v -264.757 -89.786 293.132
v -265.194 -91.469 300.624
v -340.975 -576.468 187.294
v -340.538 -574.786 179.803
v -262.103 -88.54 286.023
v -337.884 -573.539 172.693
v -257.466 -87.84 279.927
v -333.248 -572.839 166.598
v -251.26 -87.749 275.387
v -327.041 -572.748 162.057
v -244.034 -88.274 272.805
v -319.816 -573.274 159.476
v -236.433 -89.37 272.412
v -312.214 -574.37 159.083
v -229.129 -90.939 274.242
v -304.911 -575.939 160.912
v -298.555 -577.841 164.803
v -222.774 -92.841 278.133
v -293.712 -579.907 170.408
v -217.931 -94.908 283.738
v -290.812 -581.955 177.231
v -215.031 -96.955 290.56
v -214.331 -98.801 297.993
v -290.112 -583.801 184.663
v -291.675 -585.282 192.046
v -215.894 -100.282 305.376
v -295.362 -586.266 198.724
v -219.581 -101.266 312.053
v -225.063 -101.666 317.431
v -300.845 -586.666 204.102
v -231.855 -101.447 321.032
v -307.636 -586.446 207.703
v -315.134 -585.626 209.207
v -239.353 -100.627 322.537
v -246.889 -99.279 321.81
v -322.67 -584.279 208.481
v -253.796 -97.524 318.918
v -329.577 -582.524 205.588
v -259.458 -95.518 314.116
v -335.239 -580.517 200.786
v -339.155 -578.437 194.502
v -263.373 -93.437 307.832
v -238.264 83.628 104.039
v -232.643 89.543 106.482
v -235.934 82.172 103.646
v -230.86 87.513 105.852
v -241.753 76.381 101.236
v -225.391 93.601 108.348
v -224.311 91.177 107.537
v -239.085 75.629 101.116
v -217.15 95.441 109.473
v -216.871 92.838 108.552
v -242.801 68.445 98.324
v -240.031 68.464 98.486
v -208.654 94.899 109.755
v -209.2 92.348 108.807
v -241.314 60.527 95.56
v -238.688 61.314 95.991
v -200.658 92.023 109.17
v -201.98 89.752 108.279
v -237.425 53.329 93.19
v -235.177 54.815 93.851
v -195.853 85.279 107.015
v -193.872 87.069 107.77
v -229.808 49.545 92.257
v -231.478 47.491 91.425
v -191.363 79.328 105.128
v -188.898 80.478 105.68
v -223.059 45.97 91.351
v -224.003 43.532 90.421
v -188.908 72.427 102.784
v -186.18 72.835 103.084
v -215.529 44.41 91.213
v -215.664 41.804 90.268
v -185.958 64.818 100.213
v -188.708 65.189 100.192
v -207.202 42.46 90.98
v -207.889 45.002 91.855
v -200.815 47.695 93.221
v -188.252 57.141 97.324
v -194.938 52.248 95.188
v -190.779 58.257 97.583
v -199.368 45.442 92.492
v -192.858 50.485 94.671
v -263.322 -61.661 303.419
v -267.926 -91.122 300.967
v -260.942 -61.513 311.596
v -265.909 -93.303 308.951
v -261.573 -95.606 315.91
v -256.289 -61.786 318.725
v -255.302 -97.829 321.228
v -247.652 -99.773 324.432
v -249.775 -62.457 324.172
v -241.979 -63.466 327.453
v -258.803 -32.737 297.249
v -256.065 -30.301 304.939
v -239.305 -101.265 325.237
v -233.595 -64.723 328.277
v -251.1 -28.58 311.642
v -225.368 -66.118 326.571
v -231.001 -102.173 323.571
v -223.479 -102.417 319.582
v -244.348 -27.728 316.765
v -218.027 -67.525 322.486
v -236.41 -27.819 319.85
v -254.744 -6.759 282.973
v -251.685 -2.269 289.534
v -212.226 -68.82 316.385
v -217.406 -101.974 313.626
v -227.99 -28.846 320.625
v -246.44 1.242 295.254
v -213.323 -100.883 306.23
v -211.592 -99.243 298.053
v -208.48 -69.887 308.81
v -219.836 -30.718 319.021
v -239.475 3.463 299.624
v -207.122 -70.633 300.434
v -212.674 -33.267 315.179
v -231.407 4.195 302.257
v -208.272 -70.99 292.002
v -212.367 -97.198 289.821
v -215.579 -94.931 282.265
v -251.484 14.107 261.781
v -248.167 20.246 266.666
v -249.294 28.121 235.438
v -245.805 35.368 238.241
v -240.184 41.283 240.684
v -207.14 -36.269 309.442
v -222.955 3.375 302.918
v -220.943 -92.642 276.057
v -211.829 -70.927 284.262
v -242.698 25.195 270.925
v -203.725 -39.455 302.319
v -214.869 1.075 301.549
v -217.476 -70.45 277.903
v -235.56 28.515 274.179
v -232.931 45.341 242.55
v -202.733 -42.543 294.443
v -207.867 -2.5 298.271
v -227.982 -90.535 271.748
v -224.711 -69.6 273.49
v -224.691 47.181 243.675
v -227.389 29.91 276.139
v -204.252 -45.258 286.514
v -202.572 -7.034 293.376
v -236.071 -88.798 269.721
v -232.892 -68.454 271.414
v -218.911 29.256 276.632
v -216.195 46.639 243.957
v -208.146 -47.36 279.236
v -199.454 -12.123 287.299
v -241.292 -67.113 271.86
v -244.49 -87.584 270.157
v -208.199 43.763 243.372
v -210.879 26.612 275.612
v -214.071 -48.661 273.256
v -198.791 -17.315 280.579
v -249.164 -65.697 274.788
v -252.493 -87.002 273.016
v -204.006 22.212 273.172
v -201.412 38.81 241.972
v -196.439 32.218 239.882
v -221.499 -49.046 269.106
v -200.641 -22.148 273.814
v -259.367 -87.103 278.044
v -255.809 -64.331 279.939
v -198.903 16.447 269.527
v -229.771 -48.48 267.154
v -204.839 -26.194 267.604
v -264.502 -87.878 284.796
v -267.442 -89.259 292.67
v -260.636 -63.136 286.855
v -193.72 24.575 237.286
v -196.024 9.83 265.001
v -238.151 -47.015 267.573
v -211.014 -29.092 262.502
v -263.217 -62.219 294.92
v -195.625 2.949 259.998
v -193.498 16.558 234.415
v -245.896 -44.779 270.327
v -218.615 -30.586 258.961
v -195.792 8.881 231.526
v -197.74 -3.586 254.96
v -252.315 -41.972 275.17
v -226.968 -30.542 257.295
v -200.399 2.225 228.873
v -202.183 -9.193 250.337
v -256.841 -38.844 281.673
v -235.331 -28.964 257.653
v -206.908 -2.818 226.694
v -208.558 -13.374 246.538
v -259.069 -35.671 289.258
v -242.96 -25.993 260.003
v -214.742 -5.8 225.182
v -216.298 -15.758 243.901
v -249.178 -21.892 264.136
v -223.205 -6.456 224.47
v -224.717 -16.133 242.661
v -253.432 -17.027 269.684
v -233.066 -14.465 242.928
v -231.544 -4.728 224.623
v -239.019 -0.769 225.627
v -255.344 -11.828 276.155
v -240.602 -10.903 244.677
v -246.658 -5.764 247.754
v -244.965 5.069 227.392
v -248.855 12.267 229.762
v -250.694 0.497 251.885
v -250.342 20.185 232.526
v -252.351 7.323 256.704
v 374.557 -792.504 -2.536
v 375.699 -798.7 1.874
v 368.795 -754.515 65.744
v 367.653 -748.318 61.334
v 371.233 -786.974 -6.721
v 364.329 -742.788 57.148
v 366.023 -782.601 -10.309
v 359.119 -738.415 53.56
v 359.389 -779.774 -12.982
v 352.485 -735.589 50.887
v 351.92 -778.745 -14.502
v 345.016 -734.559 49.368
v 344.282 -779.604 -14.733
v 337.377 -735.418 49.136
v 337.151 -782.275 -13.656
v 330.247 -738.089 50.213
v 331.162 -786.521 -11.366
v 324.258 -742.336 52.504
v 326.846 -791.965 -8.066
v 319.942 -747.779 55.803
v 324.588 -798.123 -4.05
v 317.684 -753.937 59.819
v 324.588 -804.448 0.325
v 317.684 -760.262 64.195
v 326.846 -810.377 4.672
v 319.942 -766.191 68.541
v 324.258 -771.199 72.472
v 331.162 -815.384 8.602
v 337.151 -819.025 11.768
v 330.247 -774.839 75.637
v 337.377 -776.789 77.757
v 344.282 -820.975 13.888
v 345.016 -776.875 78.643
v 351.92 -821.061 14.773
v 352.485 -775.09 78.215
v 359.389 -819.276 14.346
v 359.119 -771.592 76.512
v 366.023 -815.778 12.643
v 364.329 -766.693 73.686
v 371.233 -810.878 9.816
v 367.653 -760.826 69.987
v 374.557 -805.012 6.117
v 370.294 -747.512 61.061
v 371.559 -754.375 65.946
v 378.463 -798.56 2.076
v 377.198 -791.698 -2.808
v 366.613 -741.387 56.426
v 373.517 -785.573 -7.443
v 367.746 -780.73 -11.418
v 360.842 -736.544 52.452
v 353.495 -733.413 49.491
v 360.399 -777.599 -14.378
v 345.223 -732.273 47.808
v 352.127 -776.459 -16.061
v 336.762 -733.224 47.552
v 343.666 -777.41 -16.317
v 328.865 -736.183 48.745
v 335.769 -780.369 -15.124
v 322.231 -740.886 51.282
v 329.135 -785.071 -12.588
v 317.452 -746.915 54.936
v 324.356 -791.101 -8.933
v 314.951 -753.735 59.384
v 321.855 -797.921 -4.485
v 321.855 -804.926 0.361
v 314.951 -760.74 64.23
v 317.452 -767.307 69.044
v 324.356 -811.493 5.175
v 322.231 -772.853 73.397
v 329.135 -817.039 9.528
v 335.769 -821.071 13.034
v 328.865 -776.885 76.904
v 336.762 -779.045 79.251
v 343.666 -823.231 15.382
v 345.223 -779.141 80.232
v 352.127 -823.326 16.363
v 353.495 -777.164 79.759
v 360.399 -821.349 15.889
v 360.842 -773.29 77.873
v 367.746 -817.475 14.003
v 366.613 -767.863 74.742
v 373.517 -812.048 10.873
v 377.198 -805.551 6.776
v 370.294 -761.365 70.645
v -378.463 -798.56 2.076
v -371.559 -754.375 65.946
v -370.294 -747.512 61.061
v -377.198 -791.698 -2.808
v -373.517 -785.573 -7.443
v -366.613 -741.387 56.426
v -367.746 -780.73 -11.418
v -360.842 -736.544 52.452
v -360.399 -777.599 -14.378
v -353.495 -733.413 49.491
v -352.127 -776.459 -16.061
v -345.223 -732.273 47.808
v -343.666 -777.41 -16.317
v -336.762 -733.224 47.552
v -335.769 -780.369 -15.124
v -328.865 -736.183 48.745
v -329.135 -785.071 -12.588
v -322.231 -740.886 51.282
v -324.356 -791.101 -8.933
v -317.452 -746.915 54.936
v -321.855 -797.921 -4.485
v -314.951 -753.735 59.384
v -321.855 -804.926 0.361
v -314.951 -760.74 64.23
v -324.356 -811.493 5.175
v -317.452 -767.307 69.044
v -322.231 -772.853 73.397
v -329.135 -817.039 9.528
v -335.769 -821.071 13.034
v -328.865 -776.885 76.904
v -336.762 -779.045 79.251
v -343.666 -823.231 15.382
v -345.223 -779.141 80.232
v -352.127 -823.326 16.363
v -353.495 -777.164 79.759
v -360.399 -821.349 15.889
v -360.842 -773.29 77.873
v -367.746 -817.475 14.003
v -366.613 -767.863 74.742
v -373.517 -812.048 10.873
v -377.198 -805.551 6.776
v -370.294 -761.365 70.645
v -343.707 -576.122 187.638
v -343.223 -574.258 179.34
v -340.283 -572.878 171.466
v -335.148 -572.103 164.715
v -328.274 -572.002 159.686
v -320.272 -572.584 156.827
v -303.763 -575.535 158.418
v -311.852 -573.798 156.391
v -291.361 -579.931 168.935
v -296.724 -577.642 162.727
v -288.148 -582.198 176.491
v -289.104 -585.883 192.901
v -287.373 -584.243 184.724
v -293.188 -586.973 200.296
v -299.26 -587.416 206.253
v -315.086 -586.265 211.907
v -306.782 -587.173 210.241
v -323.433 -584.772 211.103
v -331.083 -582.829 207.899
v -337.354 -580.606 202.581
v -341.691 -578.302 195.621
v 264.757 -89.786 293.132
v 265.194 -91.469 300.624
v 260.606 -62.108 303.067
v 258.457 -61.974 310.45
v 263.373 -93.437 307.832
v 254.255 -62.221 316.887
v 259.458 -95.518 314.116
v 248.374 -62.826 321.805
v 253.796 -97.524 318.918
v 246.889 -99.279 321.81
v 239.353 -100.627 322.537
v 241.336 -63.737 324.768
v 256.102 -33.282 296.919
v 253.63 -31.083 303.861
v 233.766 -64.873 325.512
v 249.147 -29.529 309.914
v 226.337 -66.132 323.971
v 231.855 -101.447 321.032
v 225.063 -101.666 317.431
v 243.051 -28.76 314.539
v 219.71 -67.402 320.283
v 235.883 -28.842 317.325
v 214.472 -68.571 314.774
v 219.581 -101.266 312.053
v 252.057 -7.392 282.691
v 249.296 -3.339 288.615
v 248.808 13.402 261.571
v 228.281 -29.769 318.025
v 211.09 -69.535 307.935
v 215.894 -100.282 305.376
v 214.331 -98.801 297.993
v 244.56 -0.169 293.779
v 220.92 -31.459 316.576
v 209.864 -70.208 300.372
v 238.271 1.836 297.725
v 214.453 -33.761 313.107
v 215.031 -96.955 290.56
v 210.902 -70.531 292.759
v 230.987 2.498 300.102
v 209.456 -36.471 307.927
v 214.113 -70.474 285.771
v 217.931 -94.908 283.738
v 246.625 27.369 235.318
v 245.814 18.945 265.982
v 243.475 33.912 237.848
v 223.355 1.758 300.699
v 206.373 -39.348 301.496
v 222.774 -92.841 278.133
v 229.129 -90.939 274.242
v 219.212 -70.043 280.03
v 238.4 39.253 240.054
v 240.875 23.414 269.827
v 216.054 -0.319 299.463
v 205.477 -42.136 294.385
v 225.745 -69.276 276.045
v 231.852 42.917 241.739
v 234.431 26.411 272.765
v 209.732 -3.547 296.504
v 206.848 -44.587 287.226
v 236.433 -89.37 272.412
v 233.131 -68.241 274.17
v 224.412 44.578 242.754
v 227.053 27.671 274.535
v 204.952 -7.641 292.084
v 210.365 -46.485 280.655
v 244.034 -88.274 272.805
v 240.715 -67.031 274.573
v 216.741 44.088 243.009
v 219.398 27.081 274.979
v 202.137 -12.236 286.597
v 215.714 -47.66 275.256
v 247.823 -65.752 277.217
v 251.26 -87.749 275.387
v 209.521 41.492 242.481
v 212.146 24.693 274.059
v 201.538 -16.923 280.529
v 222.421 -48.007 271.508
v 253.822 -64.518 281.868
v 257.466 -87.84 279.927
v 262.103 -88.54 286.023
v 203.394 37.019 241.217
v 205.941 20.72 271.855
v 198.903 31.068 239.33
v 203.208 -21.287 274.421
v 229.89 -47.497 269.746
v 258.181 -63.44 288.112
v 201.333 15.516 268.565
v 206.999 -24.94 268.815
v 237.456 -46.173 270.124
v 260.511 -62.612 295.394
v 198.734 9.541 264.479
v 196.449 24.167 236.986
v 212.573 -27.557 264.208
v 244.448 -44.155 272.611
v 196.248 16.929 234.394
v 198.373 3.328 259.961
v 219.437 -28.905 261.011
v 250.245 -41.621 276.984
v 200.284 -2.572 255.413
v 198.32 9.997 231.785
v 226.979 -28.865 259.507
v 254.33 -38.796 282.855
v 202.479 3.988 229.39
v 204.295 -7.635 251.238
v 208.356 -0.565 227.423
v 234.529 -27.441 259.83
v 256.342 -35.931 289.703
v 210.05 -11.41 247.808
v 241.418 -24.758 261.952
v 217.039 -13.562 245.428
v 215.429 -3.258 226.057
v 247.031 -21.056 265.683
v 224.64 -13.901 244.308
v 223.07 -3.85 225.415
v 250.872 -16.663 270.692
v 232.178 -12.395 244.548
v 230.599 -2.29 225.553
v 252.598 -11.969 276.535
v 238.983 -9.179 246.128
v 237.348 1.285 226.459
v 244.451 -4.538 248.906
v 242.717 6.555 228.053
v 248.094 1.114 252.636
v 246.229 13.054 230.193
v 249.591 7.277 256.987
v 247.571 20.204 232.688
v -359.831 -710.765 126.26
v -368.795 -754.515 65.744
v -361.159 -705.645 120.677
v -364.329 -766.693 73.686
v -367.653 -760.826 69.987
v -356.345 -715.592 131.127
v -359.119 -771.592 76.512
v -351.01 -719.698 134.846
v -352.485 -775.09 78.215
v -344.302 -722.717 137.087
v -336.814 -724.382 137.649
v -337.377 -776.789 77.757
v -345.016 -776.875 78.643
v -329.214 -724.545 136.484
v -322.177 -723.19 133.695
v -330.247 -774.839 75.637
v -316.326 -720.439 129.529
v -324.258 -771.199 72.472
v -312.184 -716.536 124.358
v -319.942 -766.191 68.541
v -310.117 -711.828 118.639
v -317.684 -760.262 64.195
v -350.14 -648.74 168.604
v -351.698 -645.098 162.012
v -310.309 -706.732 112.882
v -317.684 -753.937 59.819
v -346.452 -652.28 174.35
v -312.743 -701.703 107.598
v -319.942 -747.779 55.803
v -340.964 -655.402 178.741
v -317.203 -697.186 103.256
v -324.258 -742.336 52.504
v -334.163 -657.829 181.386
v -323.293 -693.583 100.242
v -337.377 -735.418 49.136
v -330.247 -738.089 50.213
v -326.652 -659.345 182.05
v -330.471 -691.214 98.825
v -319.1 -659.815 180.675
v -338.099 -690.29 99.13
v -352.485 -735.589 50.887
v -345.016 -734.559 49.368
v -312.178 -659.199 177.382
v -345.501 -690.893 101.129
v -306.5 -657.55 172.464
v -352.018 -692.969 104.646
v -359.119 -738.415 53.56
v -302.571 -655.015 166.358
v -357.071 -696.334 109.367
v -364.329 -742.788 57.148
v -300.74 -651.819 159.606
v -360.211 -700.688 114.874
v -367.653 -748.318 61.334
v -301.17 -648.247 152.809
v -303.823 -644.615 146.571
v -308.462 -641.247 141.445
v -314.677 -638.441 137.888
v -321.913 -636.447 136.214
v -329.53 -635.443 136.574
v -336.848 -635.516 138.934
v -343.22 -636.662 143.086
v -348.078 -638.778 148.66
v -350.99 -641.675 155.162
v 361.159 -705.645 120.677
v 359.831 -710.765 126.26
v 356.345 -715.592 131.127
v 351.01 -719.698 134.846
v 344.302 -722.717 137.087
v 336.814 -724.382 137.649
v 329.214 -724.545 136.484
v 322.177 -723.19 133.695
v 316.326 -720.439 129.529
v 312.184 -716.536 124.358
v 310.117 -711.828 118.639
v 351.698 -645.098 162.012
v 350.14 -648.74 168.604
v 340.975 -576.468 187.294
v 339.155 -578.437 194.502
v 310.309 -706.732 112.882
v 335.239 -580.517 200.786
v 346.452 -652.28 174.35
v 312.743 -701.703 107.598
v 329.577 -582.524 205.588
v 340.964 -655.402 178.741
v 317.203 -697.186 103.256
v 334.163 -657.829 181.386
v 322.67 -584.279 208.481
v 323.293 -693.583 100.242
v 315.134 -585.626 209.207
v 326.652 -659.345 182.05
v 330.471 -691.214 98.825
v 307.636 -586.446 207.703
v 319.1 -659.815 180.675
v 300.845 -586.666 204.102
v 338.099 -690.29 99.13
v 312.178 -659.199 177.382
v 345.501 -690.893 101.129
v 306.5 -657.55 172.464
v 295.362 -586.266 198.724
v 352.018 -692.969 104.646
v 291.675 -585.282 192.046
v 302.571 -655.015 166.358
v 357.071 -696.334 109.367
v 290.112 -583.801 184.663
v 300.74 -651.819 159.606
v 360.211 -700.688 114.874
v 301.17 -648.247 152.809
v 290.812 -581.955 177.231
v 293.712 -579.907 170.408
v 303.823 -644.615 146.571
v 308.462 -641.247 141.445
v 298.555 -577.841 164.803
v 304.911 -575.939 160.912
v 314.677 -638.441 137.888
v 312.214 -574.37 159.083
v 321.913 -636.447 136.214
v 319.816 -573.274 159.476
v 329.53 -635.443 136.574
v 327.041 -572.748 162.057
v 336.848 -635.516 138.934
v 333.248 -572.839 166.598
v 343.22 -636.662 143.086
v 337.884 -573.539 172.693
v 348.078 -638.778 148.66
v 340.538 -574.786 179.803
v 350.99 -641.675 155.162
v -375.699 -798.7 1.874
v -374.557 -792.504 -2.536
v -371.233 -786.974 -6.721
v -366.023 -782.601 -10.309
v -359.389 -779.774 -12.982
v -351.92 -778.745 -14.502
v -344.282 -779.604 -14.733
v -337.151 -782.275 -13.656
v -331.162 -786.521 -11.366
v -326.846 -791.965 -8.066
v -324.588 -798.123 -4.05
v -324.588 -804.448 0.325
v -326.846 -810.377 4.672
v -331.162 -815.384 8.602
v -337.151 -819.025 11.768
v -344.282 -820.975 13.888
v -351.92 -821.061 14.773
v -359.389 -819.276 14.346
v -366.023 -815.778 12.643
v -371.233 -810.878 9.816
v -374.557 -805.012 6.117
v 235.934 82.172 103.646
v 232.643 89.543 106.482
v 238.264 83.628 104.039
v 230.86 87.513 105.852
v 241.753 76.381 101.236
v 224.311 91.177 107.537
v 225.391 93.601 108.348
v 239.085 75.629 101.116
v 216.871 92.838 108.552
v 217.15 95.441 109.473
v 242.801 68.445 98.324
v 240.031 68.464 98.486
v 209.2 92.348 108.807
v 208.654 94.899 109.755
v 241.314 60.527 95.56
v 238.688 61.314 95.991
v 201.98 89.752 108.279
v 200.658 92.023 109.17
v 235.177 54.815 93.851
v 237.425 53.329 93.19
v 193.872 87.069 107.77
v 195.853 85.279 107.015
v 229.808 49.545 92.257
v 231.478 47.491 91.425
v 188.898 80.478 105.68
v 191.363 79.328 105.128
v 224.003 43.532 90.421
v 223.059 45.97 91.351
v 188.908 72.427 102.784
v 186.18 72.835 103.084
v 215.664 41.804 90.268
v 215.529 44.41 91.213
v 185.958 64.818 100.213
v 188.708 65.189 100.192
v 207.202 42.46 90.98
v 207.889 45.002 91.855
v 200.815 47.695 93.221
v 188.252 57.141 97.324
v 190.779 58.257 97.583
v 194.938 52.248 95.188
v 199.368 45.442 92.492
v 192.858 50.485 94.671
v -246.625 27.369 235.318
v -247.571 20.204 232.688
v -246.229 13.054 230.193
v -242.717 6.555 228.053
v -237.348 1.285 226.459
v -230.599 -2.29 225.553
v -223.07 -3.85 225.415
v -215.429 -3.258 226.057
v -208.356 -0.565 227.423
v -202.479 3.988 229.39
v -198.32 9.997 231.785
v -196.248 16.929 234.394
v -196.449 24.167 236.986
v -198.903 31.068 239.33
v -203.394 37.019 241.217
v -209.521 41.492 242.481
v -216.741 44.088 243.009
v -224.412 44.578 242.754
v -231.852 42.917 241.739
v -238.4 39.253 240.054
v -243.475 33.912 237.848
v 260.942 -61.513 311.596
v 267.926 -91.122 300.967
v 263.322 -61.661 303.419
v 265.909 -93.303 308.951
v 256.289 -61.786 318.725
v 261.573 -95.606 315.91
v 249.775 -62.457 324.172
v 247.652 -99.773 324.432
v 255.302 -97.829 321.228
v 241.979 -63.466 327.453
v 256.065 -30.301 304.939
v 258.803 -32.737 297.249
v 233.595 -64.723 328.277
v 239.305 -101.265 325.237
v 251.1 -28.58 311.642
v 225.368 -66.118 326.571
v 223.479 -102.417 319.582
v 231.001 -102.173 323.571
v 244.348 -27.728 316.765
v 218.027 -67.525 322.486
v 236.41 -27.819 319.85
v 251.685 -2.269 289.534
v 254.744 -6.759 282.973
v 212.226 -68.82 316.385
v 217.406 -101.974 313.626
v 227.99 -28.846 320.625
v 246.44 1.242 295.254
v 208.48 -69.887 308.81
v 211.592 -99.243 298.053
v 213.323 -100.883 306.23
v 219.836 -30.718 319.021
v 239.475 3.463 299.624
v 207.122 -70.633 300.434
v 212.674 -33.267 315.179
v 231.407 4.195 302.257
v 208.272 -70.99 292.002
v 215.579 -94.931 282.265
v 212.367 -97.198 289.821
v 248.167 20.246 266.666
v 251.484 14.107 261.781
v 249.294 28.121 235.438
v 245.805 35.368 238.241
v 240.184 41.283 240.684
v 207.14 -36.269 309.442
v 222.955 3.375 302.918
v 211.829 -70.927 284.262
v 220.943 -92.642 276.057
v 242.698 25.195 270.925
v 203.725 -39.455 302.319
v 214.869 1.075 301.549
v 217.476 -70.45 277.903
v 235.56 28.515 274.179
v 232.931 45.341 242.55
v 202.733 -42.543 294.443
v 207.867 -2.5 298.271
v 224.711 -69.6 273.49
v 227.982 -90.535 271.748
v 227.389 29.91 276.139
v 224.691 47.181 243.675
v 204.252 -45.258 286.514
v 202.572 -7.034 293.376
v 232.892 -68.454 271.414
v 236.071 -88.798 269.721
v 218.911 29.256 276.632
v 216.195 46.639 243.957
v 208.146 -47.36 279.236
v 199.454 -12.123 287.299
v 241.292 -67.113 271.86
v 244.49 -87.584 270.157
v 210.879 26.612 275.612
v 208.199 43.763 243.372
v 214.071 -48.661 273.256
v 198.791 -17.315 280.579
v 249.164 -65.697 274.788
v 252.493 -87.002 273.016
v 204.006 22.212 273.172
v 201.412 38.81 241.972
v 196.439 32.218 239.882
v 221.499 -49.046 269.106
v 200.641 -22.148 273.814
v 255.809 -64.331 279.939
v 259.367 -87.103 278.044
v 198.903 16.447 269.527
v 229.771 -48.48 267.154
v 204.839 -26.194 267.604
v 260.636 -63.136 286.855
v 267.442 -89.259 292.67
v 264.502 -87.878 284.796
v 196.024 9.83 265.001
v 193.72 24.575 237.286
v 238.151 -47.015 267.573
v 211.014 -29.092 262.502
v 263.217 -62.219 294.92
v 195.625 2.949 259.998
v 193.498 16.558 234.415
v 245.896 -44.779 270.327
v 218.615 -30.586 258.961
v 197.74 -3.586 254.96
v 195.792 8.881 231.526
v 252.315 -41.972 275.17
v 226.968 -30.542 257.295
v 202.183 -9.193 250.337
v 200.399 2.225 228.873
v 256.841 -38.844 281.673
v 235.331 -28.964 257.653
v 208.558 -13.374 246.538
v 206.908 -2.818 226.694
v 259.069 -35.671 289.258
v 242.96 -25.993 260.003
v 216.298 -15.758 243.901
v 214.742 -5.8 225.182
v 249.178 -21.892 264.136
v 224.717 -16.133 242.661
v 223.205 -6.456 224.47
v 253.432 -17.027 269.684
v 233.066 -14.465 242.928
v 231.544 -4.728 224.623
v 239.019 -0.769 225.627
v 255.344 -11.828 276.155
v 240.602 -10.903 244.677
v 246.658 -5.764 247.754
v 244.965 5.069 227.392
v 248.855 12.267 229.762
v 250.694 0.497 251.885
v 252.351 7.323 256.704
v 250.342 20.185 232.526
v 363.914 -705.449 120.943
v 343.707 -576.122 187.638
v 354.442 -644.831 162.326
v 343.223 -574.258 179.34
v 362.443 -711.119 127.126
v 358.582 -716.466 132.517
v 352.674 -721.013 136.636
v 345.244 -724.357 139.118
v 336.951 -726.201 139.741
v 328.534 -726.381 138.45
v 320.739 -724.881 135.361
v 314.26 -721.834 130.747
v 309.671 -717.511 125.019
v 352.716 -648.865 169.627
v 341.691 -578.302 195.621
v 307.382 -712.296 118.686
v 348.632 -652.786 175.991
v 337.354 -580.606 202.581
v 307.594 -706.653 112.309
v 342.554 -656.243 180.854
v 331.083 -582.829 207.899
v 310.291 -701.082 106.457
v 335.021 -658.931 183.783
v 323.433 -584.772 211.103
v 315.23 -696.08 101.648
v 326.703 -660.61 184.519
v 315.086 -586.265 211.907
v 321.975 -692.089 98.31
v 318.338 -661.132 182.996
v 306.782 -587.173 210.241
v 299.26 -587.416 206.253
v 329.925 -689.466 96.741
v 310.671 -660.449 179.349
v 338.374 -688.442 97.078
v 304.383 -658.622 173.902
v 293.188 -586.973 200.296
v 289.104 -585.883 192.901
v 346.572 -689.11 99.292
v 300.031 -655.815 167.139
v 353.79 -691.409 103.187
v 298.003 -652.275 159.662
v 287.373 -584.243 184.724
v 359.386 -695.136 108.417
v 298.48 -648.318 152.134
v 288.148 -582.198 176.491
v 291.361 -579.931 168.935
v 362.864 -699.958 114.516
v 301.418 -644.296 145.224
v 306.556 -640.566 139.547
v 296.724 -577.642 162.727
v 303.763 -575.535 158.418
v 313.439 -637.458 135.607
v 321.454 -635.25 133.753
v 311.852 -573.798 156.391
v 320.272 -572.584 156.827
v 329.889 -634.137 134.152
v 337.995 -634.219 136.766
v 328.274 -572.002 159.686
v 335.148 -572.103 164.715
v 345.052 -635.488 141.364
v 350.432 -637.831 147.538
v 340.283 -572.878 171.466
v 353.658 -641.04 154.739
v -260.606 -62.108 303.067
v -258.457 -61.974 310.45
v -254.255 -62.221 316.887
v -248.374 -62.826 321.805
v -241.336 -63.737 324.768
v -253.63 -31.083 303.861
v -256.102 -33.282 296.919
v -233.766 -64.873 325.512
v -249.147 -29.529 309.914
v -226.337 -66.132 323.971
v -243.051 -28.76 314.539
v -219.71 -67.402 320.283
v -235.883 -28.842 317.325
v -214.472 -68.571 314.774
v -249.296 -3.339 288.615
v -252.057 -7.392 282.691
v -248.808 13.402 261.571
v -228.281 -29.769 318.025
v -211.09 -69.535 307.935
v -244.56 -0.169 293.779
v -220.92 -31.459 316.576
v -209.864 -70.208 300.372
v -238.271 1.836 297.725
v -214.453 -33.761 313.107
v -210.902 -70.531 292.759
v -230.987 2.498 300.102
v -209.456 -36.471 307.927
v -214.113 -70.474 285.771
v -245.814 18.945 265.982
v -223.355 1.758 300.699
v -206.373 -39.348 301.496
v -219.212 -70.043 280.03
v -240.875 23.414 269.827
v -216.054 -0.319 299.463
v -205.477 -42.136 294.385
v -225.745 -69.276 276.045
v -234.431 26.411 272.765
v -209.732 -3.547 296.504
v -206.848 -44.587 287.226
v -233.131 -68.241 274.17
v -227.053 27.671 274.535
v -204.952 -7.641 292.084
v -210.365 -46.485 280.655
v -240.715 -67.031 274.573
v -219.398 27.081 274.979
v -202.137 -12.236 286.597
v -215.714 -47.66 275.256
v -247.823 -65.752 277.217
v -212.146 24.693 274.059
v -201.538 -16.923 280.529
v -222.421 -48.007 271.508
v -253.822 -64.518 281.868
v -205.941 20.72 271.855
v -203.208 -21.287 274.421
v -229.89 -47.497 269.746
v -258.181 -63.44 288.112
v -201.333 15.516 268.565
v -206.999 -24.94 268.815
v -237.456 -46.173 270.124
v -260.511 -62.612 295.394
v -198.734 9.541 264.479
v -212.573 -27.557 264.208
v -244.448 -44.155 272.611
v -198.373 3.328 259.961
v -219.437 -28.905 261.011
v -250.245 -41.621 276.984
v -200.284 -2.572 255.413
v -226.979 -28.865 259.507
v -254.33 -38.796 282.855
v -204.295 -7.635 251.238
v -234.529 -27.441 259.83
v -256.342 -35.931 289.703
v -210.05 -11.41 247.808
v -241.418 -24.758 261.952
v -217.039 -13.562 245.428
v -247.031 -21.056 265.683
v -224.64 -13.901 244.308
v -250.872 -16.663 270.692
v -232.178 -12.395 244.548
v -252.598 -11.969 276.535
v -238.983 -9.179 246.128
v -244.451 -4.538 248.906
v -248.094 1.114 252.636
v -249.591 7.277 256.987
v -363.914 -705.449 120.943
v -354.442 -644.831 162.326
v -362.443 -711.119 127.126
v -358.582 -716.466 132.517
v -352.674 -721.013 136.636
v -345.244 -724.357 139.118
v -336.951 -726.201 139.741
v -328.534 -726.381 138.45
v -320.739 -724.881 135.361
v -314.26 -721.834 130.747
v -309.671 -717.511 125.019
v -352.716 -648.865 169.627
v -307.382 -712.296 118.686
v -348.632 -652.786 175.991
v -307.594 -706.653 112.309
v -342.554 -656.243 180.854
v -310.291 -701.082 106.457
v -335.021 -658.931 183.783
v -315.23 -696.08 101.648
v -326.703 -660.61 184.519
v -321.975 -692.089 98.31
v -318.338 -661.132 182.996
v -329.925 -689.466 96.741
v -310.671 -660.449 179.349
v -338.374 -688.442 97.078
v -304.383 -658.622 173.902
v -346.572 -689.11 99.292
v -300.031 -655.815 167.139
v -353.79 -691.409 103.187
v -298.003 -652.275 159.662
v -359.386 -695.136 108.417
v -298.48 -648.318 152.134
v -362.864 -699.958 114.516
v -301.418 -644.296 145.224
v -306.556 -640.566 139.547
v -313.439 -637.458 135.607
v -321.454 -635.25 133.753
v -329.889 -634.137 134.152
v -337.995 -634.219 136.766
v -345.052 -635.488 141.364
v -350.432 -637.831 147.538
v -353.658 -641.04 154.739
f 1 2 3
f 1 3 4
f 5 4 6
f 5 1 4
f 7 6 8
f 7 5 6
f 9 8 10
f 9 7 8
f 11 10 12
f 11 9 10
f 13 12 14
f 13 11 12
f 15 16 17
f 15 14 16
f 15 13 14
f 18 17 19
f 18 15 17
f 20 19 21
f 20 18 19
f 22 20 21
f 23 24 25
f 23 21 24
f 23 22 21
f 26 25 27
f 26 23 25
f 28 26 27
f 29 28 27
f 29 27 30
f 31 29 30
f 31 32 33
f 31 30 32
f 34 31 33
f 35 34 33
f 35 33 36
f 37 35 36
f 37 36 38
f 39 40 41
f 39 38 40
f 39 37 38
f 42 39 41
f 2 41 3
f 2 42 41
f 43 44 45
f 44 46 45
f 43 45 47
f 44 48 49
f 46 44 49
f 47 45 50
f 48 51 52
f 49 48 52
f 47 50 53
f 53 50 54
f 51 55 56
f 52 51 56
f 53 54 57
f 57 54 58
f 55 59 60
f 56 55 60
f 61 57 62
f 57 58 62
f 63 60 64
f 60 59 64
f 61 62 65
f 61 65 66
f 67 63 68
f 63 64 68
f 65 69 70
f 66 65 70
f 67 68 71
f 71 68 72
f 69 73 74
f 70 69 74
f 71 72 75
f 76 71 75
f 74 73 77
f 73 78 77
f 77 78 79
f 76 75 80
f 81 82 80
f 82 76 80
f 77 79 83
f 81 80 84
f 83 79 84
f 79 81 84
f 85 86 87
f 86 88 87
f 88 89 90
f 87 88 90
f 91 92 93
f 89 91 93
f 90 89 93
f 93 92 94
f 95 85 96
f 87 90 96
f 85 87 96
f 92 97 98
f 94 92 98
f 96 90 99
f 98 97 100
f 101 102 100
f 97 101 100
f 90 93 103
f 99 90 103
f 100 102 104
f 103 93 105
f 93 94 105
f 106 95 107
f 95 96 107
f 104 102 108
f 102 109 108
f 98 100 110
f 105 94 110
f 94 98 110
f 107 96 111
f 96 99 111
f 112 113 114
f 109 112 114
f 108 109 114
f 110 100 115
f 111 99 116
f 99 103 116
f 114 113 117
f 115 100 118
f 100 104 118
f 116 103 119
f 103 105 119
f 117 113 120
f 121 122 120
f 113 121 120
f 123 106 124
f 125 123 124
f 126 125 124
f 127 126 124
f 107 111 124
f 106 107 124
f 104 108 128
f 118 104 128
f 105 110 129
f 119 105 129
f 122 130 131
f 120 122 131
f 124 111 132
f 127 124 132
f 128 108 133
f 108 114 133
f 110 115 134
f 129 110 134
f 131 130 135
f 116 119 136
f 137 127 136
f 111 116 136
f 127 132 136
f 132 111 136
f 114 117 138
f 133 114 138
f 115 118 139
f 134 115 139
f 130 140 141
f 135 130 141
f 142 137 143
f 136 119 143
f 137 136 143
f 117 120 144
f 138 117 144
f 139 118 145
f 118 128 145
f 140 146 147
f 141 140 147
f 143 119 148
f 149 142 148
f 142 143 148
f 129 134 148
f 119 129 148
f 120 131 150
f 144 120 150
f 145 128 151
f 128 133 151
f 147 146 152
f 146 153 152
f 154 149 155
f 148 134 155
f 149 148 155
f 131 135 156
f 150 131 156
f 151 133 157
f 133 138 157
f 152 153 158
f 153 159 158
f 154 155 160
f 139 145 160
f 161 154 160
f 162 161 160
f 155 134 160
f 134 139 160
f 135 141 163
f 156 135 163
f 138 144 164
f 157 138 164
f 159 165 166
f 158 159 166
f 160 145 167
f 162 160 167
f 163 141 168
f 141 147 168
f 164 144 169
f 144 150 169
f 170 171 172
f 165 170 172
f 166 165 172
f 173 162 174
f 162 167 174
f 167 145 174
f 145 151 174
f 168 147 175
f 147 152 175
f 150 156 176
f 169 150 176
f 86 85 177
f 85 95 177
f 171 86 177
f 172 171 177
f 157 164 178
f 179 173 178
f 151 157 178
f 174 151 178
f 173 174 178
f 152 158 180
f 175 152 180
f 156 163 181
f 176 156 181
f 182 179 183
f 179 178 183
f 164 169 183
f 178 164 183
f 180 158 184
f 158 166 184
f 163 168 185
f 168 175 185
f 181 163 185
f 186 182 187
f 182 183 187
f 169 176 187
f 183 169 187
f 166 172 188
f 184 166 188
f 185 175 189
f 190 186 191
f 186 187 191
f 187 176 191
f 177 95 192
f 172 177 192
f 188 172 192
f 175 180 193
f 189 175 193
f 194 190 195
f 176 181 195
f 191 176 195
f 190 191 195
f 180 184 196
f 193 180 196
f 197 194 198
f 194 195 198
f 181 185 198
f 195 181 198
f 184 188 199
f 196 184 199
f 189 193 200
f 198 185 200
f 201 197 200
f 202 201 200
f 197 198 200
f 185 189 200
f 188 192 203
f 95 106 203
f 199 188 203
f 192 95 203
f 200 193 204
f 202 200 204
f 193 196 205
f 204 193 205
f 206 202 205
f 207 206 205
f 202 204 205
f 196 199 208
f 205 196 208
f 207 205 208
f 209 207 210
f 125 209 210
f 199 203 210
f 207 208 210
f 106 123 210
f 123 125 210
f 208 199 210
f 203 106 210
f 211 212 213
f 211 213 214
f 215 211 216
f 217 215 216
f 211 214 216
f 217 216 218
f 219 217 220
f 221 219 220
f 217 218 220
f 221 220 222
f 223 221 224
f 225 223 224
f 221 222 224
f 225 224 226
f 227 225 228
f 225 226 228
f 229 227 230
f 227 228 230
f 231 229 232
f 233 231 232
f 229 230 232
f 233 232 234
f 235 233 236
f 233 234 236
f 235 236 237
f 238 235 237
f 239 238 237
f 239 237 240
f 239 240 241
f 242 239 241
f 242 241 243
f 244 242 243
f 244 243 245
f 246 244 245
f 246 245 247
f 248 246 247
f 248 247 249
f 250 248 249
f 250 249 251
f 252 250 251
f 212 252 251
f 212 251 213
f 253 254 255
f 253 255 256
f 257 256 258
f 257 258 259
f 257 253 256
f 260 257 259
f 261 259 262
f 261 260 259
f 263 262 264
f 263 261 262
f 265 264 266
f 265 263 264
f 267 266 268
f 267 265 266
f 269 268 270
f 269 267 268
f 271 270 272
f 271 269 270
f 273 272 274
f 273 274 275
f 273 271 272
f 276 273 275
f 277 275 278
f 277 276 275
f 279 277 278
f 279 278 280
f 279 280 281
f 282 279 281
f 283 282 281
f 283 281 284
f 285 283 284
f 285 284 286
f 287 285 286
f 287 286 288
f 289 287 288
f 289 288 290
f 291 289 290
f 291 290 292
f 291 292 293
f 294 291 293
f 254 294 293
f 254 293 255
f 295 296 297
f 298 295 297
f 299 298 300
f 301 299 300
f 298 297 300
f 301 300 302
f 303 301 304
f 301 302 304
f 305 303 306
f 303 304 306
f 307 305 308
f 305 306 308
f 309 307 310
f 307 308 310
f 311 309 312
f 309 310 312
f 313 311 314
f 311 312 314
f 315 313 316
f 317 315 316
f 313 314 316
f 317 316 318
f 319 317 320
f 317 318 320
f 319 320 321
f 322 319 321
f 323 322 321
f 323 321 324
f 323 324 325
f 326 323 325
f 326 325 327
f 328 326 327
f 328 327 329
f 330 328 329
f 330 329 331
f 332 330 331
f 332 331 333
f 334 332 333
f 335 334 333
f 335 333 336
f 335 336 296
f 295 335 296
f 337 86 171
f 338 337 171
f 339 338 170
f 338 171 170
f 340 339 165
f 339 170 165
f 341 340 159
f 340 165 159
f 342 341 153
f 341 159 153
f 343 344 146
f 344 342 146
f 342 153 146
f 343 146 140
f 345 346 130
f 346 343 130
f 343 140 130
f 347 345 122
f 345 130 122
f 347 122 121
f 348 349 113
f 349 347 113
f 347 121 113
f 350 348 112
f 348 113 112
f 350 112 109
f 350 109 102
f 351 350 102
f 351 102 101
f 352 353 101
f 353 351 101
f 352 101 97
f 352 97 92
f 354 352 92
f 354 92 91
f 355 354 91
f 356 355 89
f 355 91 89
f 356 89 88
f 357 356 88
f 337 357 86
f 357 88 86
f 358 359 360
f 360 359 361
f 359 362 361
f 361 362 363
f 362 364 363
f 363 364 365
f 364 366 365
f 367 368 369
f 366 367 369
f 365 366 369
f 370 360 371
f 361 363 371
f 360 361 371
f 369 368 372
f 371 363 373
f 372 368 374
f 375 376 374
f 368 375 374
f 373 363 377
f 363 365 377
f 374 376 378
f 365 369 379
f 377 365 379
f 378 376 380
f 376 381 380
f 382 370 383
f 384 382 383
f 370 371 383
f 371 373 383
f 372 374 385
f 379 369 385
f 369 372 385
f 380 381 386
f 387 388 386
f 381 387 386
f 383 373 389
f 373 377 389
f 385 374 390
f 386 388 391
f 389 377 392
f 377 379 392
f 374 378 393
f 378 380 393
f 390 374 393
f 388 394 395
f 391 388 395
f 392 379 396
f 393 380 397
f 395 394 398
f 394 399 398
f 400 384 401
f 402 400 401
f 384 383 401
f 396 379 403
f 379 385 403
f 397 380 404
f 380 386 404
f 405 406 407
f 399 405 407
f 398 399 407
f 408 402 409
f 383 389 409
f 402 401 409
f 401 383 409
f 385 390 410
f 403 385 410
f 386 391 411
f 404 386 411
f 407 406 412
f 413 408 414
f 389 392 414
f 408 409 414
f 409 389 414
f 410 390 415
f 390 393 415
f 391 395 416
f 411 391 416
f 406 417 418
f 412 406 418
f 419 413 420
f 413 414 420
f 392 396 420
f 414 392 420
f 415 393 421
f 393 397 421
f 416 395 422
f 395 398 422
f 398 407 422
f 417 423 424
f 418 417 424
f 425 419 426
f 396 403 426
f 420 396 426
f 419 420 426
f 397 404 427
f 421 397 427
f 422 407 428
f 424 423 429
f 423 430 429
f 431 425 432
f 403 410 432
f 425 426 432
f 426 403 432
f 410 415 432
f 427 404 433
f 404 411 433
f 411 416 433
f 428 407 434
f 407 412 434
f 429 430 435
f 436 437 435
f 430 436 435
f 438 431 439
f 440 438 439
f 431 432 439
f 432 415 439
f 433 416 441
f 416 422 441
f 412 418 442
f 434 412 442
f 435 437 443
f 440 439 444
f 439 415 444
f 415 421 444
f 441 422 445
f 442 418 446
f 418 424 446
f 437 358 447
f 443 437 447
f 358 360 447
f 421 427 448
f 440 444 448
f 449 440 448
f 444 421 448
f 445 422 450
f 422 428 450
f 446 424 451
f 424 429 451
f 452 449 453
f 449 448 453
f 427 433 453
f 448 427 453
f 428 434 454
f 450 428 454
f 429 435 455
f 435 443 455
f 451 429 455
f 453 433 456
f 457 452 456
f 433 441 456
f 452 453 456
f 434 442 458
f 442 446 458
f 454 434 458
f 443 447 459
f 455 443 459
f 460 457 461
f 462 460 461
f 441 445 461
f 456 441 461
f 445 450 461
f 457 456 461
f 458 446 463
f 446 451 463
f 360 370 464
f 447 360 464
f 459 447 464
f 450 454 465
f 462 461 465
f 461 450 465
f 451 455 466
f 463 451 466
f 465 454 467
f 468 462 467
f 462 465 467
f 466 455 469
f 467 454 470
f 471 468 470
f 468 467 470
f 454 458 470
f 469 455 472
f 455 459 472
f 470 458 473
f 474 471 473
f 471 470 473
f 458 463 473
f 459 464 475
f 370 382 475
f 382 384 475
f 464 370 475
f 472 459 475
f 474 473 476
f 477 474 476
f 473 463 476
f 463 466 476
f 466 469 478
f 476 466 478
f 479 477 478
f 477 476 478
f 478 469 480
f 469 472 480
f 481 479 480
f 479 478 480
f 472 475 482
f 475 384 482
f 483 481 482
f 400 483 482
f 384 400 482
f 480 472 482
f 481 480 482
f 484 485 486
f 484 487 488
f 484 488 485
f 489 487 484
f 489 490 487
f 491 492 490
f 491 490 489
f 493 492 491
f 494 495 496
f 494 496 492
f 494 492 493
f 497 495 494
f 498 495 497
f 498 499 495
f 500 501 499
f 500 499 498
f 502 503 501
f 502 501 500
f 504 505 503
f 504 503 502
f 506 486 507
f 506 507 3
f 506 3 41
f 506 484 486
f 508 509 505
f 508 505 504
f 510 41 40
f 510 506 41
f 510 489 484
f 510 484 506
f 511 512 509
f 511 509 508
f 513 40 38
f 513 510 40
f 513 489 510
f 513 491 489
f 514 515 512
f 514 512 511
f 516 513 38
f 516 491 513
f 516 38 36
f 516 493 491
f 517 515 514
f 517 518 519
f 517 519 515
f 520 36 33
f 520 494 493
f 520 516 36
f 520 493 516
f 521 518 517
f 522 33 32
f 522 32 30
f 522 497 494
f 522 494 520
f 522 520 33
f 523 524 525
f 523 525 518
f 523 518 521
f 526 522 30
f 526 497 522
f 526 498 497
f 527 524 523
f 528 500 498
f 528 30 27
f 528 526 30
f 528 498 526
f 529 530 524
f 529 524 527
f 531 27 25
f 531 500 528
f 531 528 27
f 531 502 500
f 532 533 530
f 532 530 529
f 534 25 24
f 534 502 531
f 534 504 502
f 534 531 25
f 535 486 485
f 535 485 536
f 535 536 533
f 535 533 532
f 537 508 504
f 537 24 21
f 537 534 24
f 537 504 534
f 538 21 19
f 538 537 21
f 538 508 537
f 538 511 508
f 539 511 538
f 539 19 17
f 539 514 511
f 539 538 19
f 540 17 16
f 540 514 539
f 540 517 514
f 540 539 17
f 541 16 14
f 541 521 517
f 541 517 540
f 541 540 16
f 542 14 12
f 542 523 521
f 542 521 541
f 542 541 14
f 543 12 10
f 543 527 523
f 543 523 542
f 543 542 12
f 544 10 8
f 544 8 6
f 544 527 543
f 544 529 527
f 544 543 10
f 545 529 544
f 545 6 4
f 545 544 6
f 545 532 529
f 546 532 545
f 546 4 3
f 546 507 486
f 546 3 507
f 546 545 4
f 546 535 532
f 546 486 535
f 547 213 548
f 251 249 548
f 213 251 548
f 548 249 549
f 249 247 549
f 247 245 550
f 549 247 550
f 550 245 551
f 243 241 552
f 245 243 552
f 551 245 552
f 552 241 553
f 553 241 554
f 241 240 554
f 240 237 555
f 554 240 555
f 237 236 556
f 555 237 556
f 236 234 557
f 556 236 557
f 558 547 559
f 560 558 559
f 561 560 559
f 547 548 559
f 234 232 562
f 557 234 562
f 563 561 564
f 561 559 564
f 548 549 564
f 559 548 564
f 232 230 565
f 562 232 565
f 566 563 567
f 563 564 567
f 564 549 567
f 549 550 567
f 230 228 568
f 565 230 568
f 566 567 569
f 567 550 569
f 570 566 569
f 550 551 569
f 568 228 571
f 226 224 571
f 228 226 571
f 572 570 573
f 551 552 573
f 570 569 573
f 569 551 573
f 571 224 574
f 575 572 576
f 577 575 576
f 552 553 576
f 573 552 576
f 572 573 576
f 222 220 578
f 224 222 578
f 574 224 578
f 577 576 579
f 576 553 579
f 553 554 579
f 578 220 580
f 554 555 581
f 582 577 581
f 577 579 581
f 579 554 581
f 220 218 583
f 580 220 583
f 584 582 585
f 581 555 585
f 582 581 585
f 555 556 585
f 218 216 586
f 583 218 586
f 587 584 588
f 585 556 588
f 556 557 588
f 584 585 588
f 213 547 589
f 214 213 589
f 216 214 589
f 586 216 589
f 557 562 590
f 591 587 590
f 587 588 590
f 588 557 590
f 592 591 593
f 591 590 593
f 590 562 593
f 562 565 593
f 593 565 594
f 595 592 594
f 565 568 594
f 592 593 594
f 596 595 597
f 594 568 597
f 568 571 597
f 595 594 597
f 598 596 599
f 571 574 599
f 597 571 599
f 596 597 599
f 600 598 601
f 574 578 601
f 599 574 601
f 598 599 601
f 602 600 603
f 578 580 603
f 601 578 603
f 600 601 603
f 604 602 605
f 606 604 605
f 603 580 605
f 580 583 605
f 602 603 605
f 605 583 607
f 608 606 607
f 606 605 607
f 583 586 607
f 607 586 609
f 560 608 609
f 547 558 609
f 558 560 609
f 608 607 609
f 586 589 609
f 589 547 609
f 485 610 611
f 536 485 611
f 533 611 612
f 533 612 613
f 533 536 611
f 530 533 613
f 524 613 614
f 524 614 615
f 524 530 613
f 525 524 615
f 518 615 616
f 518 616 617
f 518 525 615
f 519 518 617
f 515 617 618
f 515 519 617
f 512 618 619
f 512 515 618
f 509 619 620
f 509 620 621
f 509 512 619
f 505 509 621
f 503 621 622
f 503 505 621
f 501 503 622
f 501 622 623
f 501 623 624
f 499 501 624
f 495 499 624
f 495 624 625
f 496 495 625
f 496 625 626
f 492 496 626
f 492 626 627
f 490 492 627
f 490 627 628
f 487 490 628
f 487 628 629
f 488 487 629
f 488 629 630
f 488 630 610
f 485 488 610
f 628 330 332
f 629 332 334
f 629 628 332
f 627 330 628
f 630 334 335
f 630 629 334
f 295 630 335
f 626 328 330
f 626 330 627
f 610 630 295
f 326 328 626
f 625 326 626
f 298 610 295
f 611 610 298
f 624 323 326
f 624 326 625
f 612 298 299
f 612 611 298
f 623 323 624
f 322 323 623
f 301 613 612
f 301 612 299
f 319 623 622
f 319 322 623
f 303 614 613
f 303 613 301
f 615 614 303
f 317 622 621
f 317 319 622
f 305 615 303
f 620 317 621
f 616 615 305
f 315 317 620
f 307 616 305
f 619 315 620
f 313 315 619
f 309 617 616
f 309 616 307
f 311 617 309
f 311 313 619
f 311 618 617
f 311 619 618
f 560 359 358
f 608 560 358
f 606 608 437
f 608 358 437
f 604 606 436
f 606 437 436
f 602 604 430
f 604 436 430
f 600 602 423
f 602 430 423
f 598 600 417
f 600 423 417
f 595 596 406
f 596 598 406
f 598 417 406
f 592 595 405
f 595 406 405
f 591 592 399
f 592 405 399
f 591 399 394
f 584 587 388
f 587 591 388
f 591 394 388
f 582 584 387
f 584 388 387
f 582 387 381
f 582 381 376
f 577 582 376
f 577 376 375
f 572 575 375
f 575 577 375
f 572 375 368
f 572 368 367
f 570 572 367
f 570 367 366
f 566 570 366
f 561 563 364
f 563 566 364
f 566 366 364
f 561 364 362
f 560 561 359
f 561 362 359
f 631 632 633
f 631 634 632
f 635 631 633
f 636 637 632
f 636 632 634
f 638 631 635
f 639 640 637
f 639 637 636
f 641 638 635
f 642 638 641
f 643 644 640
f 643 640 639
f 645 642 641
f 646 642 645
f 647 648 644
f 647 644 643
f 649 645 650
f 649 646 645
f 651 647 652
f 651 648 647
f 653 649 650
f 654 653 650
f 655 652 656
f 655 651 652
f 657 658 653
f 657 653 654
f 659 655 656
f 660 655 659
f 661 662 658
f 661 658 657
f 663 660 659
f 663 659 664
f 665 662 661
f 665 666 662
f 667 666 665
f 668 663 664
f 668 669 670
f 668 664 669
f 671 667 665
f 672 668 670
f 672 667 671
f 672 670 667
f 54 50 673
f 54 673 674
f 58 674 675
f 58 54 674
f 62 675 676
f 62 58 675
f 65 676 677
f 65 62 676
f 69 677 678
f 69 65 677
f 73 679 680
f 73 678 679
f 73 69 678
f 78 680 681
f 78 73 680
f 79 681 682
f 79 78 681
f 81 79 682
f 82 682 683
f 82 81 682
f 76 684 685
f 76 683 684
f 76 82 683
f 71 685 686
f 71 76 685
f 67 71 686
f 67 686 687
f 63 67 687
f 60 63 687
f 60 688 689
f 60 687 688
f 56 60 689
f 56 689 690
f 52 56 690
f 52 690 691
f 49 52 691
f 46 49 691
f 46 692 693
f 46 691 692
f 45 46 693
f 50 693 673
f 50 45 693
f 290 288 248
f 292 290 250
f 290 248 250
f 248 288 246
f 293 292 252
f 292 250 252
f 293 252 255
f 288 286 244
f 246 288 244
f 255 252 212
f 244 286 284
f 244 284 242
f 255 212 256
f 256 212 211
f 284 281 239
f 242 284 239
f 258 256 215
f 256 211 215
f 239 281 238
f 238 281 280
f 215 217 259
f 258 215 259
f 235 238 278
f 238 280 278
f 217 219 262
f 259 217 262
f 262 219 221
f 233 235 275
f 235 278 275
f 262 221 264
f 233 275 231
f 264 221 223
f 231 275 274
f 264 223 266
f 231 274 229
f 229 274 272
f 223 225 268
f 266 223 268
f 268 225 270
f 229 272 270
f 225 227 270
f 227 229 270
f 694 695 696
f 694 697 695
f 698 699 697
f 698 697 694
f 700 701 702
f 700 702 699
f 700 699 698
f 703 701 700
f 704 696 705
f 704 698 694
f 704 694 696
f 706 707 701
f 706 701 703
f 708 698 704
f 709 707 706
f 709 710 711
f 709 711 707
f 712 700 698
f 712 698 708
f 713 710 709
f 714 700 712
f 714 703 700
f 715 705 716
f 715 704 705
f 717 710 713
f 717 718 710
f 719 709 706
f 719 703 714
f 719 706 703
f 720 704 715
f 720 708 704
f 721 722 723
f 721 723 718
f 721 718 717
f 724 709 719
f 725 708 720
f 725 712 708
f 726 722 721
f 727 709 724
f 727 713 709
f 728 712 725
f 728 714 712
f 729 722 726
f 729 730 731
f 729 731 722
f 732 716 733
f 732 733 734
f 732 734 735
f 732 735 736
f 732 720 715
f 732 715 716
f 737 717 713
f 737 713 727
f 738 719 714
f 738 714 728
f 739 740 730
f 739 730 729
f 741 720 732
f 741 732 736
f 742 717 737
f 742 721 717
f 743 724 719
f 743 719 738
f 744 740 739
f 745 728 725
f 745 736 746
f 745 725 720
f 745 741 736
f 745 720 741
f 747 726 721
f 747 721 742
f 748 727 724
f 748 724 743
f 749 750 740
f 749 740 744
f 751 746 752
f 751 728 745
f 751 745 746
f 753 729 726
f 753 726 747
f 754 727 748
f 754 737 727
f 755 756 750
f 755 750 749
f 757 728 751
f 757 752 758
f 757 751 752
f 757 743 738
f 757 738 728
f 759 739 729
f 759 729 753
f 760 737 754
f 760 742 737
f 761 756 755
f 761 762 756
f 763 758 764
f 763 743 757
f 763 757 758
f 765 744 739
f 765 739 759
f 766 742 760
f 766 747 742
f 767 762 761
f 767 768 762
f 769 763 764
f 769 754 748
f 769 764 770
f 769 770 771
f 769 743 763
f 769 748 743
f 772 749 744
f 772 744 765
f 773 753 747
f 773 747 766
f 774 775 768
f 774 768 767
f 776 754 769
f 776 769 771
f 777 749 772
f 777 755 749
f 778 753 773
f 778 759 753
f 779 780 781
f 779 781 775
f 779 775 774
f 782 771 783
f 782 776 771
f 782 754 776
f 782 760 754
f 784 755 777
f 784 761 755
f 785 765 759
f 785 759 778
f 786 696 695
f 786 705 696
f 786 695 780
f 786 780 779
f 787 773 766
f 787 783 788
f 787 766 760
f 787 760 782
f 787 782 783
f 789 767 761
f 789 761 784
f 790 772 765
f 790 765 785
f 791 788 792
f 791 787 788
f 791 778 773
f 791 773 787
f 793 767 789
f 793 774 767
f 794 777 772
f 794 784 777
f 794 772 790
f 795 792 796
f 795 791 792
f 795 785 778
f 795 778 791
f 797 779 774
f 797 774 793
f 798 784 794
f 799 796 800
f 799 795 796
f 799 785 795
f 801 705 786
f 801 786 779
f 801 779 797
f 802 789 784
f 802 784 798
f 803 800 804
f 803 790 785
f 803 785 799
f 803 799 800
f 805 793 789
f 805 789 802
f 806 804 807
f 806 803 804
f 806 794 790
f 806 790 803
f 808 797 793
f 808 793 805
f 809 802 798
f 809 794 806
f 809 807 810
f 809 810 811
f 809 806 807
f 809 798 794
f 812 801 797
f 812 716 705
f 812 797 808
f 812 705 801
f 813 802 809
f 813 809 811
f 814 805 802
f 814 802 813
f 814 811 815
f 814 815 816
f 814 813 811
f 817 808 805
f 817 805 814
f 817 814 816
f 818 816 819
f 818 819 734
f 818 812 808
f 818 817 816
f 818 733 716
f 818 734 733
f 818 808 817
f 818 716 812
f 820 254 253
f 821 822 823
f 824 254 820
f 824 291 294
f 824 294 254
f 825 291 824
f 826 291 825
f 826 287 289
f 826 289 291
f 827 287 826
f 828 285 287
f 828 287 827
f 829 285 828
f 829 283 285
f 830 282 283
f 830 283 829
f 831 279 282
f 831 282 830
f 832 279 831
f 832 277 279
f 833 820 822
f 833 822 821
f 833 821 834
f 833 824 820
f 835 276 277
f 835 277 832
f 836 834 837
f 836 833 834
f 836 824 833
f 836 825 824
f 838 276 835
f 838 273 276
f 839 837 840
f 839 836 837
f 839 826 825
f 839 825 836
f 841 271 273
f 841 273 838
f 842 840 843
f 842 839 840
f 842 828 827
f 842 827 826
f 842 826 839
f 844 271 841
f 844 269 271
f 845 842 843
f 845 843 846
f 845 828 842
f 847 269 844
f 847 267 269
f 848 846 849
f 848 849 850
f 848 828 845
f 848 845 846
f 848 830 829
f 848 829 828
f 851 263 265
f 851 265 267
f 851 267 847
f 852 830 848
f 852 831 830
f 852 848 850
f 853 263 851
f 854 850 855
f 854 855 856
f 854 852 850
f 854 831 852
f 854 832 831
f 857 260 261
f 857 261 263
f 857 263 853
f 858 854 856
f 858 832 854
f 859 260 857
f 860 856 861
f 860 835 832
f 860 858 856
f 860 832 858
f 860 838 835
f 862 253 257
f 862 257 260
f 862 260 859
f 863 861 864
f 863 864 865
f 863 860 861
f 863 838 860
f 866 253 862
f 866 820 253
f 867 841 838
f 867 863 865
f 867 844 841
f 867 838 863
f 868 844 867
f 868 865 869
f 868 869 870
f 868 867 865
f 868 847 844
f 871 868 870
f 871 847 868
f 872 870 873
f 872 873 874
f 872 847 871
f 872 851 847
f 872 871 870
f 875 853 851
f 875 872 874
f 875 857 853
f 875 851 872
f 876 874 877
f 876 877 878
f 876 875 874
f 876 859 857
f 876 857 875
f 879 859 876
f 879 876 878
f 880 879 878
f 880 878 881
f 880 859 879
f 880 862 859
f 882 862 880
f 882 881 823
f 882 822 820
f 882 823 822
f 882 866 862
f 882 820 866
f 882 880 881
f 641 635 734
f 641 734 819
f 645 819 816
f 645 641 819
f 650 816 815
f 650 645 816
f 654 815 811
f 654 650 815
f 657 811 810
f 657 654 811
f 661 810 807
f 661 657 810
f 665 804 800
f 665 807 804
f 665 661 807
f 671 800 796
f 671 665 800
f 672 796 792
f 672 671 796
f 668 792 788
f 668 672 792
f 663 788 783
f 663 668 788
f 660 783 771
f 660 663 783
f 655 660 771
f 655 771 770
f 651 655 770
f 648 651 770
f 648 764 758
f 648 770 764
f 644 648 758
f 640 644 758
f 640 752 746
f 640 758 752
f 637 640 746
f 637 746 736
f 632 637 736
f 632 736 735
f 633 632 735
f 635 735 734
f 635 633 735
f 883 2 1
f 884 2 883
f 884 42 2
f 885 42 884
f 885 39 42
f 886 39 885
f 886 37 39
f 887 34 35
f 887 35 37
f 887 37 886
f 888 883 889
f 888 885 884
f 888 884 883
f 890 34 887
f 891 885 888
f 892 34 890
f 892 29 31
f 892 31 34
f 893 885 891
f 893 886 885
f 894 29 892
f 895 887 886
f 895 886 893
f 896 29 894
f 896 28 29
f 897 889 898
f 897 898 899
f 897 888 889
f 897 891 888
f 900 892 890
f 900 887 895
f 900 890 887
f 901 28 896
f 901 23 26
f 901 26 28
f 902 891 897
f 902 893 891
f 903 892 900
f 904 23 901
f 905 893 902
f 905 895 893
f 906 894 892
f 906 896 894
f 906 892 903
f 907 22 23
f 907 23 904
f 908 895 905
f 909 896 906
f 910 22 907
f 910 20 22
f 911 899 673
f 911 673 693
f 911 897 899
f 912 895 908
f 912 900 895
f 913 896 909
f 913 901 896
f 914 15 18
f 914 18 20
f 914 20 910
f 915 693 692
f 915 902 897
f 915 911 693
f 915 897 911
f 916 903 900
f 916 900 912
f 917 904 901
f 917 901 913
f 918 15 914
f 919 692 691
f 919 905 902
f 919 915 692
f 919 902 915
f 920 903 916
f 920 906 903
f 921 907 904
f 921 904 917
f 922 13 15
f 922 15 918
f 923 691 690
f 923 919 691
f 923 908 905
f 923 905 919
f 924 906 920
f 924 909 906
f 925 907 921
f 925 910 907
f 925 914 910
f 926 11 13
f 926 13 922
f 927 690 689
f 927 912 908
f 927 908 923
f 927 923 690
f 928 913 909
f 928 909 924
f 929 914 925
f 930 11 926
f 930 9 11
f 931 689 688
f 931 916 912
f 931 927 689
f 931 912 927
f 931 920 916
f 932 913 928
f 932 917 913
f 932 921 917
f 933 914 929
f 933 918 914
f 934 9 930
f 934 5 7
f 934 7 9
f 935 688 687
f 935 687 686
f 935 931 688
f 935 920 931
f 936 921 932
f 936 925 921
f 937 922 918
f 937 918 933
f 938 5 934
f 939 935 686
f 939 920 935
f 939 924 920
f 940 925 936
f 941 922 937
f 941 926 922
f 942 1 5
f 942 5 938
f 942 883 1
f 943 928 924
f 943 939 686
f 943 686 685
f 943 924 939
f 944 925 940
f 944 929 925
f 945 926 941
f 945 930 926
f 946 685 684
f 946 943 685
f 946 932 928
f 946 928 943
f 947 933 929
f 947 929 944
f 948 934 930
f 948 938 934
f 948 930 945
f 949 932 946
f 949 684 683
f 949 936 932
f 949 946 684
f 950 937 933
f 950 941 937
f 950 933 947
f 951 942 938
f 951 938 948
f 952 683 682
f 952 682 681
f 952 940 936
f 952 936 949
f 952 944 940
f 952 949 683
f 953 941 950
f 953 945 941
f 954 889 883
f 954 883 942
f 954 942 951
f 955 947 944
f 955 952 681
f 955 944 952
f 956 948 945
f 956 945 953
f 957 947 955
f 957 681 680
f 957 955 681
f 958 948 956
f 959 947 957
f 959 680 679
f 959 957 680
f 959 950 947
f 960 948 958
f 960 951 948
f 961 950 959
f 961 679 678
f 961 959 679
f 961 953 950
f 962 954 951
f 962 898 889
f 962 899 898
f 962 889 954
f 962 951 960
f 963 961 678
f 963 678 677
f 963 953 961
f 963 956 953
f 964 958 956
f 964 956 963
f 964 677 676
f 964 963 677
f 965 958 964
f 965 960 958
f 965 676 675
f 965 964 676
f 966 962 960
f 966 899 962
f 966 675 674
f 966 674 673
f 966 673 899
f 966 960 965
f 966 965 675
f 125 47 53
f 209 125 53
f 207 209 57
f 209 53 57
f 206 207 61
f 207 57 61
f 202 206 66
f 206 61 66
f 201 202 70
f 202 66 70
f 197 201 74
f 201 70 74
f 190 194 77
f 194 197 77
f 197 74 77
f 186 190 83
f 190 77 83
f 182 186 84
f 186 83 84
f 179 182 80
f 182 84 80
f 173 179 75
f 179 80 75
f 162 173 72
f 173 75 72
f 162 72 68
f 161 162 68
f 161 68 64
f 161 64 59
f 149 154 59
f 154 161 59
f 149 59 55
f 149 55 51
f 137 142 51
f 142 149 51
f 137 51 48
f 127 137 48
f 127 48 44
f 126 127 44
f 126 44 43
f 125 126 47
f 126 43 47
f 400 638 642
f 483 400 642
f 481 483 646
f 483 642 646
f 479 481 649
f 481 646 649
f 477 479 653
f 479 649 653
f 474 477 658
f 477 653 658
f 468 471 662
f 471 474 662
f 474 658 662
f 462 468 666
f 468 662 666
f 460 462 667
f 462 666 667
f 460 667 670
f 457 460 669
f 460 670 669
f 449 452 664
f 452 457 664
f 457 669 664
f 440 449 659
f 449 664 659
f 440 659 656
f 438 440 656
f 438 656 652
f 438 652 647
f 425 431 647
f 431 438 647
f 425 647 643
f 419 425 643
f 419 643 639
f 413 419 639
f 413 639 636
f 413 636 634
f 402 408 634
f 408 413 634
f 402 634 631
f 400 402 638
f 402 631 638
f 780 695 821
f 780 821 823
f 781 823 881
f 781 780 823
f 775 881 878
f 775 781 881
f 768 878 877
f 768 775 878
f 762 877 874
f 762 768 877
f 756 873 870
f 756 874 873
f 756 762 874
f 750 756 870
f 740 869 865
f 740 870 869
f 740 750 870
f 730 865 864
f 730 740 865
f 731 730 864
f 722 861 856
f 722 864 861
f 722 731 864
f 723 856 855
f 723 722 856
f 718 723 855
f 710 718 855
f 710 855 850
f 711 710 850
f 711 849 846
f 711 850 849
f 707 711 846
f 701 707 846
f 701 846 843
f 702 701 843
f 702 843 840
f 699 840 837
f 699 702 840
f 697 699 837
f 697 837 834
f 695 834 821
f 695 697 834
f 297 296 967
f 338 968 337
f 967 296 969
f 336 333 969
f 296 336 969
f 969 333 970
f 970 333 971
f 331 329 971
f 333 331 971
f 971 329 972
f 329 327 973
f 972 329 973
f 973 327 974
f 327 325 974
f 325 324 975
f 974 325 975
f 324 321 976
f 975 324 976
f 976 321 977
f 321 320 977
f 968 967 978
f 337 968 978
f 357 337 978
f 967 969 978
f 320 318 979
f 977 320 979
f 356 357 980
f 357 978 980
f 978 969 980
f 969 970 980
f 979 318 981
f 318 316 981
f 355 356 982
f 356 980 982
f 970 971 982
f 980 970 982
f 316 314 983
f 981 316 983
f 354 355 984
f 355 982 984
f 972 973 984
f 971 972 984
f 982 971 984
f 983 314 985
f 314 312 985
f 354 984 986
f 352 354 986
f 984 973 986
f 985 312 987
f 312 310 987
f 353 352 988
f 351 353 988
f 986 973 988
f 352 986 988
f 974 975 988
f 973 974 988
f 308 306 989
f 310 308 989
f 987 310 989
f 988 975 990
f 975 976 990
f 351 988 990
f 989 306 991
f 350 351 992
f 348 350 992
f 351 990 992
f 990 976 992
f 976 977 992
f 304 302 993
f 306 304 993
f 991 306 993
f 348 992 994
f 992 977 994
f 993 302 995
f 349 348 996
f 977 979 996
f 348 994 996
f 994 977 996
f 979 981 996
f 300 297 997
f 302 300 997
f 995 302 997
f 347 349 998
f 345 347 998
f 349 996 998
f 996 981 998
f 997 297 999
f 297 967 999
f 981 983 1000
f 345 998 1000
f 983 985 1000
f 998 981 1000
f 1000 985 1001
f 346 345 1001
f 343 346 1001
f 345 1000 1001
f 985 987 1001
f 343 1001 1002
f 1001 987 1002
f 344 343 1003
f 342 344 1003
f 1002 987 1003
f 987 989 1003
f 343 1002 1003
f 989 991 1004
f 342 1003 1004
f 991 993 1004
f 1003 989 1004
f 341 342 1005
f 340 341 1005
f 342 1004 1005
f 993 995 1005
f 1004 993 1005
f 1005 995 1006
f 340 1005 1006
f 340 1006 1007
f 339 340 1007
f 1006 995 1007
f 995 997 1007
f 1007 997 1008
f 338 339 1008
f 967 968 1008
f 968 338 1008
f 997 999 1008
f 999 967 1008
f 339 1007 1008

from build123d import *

# Parameters (mm, degrees)
F6_R   = 28.575
F6_R_2 = 25.8


# Not quite as in the source:
# - a pattern or mirror of a feature is missing from the dataset's text; its kind, count and spacing are read off the source's solid


with BuildPart() as f7:
    # F7: sweep along a path in F4
    with BuildLine(Plane(origin=(219.6377502383, 34.3183984747, 0), x_dir=(0.1543768803, -0.9880120338, 0), z_dir=(-0.9880120338, -0.1543768803, 0))) as f7_path:
        Line((844.4415350966, -0.0045336783), (799.7197425418, 63.8648052169))
        ThreePointArc((799.7197425418, 63.8648052169), (721.7320002963, 140.5031460781), (621.4594455582, 184.1028937472))
        Line((621.4594455582, 184.1028937472), (130.575108047, 297.4324728002))
        ThreePointArc((130.575108047, 297.4324728002), (60.3641265867, 287.8771775879), (14.1107405341, 234.1974806543))
        Line((14.1107405341, 234.1974806543), (-34.7347980616, 99.9954663217))
    # F6 (on line) → F7 (sweep)
    with BuildSketch(Plane(origin=(42.8881960501, -274.4844547207, -396.7607817515), x_dir=(0.9960720051, 0.0503774711, 0.072819442), z_dir=(-0.0885469408, 0.5667004214, 0.8191520443))):
        with Locations((308.3228947197, -657.9033070538)):
            Circle(F6_R)
        with Locations((308.3228947197, -657.9033070538)):
            Circle(F6_R_2, mode=Mode.SUBTRACT)
    sweep(path=f7_path.line)


with BuildPart() as f7_copies_1:
    # F7_copies: instance of F7
    add(f7.part.mirror(Plane(origin=(0, 0, 0), x_dir=(0, 0, -1), z_dir=(-1, 0, 0))))


solid = Compound([f7.part, f7_copies_1.part])
